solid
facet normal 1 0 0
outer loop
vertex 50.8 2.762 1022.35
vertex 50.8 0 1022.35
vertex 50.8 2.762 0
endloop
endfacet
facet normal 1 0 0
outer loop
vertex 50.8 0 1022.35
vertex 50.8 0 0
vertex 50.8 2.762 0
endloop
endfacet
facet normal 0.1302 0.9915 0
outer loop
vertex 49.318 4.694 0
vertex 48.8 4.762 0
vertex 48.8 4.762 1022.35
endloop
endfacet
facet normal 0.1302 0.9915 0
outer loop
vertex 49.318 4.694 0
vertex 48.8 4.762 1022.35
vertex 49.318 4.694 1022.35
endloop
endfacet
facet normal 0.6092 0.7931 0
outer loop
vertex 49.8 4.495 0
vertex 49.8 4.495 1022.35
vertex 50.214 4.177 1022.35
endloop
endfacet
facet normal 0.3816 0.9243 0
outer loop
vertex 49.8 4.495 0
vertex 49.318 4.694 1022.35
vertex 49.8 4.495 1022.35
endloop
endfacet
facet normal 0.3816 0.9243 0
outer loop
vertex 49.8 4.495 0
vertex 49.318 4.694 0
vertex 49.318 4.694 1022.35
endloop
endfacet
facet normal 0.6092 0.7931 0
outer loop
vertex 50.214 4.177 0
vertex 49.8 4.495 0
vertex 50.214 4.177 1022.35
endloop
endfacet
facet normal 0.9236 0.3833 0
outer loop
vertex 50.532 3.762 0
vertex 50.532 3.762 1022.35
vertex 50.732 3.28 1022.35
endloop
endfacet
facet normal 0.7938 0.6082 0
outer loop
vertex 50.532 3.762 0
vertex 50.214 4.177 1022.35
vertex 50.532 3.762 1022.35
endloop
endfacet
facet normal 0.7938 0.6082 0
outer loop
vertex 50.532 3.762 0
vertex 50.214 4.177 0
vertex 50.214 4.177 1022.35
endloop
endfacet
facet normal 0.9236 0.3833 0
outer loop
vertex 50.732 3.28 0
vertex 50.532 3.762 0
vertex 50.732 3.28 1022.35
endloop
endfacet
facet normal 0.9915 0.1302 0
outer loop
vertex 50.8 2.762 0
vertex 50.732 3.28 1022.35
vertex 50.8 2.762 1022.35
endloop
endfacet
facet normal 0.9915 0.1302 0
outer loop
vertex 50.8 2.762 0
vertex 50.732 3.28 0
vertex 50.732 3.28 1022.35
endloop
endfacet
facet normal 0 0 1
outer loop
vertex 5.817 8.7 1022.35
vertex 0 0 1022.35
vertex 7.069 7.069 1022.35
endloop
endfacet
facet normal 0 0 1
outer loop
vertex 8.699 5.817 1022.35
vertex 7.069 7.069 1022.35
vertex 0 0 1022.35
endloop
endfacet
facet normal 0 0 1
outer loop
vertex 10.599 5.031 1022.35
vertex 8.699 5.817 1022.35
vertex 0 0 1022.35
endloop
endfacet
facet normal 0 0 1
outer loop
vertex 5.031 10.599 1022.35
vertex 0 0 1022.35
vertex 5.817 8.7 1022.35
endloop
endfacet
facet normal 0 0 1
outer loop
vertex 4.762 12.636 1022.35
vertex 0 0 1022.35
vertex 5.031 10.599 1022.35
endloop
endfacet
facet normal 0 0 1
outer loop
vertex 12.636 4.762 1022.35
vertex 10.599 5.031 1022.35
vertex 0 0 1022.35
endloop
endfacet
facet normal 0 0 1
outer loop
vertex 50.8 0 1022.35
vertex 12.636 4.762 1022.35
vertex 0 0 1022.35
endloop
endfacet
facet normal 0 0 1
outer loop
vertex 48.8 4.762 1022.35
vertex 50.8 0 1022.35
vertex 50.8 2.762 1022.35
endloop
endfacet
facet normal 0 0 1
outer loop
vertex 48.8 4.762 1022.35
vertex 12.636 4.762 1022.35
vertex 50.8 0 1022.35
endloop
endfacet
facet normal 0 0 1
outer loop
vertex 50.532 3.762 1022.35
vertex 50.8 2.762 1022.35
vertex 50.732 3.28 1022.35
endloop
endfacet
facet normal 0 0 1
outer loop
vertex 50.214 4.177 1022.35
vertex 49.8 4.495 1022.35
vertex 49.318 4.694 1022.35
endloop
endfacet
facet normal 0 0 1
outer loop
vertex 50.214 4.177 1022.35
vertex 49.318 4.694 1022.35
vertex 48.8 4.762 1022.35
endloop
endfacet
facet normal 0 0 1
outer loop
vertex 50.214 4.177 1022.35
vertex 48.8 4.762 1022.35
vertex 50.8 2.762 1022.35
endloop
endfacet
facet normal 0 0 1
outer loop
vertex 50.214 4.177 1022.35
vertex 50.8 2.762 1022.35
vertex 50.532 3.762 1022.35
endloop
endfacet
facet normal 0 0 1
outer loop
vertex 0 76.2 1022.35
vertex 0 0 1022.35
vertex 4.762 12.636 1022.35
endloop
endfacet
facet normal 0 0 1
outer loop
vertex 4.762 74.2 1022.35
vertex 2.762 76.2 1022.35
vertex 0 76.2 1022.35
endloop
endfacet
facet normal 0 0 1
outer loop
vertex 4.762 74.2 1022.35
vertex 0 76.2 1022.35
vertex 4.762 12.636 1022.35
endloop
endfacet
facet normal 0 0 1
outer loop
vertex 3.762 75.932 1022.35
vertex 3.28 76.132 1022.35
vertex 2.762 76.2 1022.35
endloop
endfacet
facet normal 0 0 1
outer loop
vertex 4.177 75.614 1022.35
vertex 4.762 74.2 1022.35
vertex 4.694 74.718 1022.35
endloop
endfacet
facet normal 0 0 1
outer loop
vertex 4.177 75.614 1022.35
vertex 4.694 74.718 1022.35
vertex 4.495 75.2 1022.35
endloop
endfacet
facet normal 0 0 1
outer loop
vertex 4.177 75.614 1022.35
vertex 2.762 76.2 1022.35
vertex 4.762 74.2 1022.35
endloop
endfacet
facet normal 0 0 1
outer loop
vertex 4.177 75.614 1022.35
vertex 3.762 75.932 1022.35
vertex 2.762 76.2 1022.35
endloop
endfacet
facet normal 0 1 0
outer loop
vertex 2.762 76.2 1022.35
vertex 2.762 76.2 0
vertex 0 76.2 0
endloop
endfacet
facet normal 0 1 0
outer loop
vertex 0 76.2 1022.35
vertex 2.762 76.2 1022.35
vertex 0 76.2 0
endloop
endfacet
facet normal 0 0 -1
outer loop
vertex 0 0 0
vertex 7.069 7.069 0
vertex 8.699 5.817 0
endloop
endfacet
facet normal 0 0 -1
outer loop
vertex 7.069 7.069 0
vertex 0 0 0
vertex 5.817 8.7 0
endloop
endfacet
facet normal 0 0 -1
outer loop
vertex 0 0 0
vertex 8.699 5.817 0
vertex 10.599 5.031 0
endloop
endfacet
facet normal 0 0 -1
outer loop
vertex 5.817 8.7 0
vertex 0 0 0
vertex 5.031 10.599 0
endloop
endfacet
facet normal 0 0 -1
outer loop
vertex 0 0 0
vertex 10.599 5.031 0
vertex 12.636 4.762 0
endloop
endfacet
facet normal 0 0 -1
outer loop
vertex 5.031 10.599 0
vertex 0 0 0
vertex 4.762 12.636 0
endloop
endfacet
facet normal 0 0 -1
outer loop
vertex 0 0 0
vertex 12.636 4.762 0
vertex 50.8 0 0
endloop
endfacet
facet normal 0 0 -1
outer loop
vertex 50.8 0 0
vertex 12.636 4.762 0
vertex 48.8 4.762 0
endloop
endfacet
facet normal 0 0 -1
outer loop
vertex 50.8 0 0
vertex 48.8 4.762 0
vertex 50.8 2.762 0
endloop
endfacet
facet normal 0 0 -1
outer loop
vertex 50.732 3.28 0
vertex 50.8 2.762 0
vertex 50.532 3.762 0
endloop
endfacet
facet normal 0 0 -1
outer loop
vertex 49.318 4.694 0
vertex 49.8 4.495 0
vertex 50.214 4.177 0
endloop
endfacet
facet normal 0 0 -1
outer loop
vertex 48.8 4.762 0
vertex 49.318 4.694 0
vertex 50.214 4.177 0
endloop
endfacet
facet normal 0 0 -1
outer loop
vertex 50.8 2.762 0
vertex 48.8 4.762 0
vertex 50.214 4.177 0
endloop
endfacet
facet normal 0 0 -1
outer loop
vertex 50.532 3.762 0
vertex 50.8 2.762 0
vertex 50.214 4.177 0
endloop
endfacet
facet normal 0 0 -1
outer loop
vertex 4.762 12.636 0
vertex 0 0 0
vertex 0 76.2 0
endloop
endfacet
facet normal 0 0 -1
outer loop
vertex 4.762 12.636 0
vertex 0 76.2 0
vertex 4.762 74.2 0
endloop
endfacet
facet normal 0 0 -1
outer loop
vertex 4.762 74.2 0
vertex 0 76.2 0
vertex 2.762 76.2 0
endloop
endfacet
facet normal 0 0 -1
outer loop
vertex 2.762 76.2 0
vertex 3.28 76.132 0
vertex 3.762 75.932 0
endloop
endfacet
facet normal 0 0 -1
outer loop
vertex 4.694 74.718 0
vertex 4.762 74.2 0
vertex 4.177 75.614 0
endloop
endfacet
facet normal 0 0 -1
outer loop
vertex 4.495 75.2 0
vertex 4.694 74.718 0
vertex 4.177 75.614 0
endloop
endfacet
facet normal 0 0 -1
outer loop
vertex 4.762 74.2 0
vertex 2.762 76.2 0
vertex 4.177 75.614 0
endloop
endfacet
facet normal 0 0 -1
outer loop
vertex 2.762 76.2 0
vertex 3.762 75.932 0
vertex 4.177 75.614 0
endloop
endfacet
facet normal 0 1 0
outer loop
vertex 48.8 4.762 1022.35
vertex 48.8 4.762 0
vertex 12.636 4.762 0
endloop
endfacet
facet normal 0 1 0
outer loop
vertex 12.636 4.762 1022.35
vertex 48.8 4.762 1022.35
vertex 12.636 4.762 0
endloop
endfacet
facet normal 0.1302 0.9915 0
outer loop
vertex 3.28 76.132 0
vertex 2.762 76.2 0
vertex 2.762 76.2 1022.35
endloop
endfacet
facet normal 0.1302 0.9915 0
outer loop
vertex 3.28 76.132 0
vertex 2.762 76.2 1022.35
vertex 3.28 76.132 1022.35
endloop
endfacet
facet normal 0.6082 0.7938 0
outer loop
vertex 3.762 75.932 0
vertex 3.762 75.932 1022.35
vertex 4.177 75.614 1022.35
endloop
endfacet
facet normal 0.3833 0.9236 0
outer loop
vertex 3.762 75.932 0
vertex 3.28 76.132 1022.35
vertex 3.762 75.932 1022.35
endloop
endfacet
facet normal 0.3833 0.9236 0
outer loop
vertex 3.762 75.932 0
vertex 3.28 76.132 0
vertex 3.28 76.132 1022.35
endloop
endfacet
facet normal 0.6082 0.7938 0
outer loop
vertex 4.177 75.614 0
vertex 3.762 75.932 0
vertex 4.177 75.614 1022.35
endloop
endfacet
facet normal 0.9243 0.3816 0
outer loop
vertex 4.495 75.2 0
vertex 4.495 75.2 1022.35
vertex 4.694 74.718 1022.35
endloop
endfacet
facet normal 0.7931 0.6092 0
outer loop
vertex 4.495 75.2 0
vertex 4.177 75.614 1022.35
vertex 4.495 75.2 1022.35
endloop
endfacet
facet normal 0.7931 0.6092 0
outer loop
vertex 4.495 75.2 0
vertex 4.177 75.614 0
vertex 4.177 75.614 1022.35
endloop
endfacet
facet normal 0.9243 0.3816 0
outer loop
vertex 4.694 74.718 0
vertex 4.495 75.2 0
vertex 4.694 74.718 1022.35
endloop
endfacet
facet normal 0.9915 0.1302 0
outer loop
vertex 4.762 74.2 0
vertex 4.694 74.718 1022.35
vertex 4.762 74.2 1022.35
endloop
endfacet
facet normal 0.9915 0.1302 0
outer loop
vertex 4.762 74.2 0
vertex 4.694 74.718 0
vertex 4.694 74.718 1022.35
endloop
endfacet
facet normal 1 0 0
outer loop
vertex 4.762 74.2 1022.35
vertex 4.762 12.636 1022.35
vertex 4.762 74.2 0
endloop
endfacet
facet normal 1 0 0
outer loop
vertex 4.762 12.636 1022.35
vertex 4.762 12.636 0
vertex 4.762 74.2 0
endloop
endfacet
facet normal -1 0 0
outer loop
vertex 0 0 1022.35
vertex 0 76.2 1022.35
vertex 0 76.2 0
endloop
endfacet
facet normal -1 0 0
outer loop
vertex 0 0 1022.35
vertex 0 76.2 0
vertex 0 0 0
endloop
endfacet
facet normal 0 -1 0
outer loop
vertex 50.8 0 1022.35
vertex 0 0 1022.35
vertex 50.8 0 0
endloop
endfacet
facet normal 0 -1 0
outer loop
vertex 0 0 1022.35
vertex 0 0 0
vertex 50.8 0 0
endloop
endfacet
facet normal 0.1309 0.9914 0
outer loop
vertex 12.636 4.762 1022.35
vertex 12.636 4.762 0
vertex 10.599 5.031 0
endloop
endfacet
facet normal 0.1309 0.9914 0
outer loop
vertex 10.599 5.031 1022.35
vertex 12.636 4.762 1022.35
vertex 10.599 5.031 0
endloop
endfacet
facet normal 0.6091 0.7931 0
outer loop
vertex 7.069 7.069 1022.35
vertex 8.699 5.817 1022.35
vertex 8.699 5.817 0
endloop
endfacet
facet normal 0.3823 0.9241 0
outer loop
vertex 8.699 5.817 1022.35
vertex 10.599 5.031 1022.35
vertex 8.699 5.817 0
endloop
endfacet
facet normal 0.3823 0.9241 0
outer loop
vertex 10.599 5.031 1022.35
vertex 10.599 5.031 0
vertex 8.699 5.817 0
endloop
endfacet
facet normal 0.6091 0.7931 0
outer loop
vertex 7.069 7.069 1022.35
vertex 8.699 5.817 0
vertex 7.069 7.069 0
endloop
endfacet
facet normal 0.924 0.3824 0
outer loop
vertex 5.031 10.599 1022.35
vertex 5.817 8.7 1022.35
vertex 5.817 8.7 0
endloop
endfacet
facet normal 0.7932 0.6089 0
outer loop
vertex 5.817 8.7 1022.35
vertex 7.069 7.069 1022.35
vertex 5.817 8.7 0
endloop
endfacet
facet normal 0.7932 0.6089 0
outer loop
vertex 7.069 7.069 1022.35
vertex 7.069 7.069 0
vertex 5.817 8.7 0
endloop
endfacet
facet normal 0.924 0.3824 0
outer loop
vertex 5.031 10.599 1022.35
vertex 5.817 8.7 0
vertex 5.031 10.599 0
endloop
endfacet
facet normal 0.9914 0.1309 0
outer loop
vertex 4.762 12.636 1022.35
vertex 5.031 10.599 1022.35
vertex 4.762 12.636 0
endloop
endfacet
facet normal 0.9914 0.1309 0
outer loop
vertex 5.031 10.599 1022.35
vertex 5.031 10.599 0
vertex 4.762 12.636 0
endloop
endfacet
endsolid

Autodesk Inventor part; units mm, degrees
ref_plane "YZ Plane" through (0, 0, 0) normal (1, 0, 0) x (0, 1, 0)
ref_plane "Start plane" through (0, 0, 0) normal (0, 0, 1) x (1, 0, 0)
ref_plane "End plane" through (0, 0, 1022.35) normal (0, 0, 1) x (1, 0, 0)
sketch "Sketch" plane through (0, 0, 0) normal (0, 0, 1) x (1, 0, 0)
  line L0 (0, 76.2) -> (0, 0)
  line L1 (0, 0) -> (50.8, 0)
  line L2 (50.8, 0) -> (50.8, 2.7625)
  line L3 (48.8, 4.7625) -> (12.6365, 4.7625)
  line L4 (4.7625, 12.6365) -> (4.7625, 74.2)
  line L5 (2.7625, 76.2) -> (0, 76.2)
  line L6 (-7.0414, 0) -> (21.5385, 0) construction
  line L7 (0, -8.0414) -> (0, 34.5385) construction
  arc A0 (4.7625, 12.6365) -> (12.6365, 4.7625) centre (12.6365, 12.6365) ccw
  arc A1 (50.8, 2.7625) -> (48.8, 4.7625) centre (48.8, 2.7625) ccw
  arc A2 (4.7625, 74.2) -> (2.7625, 76.2) centre (2.7625, 74.2) ccw
  line L8 (0, 93.5453) -> (0, -24.9725) construction
  line L9 (-18.6925, 0) -> (62.8653, 0) construction
  point P0 (50.8, 4.7625)
  point P1 (4.7625, 4.7625)
  point P2 (4.7625, 76.2)
  dimension "d12" = 4.7625
  dimension "d13" = 76.2
  dimension "d14" = 50.8
  dimension "d15" = 0
  dimension "d16" = 4.7625
  dimension "d17" = 0
  dimension "d18" = 7.874
  dimension "d19" = 2
extrude "Body" add sketch "Sketch" along normal up to surface (1022.35 mm away) from surface at 0
equation "\"d12\" = G_T"
equation "\"d13\" = G_H"
equation "\"d14\" = G_W"
equation "\"d16\" = G_T"
equation "\"d18\" = G_IR"
equation "\"d4\" = G_L"
equation "\"G_W\" = 50.8"
equation "\"G_H\" = 76.2"
equation "\"G_T\" = 4.7625"
equation "\"G_ER\" = 4.064"
equation "\"G_IR\" = 7.874"
equation "\"G_L\" = B_L + G_OFFSET_START + G_OFFSET_END"
equation "\"ex\" = 0"
equation "\"ey\" = 0"
equation "\"G_OFFSET_START\" = 0"
equation "\"G_OFFSET_END\" = 0"
equation "\"d21\" = G_OFFSET_END + B_L"
equation "\"B_L\" = 1022.35"
properties part number "ANSI L 3 x 2 x 3_16 00000005"
